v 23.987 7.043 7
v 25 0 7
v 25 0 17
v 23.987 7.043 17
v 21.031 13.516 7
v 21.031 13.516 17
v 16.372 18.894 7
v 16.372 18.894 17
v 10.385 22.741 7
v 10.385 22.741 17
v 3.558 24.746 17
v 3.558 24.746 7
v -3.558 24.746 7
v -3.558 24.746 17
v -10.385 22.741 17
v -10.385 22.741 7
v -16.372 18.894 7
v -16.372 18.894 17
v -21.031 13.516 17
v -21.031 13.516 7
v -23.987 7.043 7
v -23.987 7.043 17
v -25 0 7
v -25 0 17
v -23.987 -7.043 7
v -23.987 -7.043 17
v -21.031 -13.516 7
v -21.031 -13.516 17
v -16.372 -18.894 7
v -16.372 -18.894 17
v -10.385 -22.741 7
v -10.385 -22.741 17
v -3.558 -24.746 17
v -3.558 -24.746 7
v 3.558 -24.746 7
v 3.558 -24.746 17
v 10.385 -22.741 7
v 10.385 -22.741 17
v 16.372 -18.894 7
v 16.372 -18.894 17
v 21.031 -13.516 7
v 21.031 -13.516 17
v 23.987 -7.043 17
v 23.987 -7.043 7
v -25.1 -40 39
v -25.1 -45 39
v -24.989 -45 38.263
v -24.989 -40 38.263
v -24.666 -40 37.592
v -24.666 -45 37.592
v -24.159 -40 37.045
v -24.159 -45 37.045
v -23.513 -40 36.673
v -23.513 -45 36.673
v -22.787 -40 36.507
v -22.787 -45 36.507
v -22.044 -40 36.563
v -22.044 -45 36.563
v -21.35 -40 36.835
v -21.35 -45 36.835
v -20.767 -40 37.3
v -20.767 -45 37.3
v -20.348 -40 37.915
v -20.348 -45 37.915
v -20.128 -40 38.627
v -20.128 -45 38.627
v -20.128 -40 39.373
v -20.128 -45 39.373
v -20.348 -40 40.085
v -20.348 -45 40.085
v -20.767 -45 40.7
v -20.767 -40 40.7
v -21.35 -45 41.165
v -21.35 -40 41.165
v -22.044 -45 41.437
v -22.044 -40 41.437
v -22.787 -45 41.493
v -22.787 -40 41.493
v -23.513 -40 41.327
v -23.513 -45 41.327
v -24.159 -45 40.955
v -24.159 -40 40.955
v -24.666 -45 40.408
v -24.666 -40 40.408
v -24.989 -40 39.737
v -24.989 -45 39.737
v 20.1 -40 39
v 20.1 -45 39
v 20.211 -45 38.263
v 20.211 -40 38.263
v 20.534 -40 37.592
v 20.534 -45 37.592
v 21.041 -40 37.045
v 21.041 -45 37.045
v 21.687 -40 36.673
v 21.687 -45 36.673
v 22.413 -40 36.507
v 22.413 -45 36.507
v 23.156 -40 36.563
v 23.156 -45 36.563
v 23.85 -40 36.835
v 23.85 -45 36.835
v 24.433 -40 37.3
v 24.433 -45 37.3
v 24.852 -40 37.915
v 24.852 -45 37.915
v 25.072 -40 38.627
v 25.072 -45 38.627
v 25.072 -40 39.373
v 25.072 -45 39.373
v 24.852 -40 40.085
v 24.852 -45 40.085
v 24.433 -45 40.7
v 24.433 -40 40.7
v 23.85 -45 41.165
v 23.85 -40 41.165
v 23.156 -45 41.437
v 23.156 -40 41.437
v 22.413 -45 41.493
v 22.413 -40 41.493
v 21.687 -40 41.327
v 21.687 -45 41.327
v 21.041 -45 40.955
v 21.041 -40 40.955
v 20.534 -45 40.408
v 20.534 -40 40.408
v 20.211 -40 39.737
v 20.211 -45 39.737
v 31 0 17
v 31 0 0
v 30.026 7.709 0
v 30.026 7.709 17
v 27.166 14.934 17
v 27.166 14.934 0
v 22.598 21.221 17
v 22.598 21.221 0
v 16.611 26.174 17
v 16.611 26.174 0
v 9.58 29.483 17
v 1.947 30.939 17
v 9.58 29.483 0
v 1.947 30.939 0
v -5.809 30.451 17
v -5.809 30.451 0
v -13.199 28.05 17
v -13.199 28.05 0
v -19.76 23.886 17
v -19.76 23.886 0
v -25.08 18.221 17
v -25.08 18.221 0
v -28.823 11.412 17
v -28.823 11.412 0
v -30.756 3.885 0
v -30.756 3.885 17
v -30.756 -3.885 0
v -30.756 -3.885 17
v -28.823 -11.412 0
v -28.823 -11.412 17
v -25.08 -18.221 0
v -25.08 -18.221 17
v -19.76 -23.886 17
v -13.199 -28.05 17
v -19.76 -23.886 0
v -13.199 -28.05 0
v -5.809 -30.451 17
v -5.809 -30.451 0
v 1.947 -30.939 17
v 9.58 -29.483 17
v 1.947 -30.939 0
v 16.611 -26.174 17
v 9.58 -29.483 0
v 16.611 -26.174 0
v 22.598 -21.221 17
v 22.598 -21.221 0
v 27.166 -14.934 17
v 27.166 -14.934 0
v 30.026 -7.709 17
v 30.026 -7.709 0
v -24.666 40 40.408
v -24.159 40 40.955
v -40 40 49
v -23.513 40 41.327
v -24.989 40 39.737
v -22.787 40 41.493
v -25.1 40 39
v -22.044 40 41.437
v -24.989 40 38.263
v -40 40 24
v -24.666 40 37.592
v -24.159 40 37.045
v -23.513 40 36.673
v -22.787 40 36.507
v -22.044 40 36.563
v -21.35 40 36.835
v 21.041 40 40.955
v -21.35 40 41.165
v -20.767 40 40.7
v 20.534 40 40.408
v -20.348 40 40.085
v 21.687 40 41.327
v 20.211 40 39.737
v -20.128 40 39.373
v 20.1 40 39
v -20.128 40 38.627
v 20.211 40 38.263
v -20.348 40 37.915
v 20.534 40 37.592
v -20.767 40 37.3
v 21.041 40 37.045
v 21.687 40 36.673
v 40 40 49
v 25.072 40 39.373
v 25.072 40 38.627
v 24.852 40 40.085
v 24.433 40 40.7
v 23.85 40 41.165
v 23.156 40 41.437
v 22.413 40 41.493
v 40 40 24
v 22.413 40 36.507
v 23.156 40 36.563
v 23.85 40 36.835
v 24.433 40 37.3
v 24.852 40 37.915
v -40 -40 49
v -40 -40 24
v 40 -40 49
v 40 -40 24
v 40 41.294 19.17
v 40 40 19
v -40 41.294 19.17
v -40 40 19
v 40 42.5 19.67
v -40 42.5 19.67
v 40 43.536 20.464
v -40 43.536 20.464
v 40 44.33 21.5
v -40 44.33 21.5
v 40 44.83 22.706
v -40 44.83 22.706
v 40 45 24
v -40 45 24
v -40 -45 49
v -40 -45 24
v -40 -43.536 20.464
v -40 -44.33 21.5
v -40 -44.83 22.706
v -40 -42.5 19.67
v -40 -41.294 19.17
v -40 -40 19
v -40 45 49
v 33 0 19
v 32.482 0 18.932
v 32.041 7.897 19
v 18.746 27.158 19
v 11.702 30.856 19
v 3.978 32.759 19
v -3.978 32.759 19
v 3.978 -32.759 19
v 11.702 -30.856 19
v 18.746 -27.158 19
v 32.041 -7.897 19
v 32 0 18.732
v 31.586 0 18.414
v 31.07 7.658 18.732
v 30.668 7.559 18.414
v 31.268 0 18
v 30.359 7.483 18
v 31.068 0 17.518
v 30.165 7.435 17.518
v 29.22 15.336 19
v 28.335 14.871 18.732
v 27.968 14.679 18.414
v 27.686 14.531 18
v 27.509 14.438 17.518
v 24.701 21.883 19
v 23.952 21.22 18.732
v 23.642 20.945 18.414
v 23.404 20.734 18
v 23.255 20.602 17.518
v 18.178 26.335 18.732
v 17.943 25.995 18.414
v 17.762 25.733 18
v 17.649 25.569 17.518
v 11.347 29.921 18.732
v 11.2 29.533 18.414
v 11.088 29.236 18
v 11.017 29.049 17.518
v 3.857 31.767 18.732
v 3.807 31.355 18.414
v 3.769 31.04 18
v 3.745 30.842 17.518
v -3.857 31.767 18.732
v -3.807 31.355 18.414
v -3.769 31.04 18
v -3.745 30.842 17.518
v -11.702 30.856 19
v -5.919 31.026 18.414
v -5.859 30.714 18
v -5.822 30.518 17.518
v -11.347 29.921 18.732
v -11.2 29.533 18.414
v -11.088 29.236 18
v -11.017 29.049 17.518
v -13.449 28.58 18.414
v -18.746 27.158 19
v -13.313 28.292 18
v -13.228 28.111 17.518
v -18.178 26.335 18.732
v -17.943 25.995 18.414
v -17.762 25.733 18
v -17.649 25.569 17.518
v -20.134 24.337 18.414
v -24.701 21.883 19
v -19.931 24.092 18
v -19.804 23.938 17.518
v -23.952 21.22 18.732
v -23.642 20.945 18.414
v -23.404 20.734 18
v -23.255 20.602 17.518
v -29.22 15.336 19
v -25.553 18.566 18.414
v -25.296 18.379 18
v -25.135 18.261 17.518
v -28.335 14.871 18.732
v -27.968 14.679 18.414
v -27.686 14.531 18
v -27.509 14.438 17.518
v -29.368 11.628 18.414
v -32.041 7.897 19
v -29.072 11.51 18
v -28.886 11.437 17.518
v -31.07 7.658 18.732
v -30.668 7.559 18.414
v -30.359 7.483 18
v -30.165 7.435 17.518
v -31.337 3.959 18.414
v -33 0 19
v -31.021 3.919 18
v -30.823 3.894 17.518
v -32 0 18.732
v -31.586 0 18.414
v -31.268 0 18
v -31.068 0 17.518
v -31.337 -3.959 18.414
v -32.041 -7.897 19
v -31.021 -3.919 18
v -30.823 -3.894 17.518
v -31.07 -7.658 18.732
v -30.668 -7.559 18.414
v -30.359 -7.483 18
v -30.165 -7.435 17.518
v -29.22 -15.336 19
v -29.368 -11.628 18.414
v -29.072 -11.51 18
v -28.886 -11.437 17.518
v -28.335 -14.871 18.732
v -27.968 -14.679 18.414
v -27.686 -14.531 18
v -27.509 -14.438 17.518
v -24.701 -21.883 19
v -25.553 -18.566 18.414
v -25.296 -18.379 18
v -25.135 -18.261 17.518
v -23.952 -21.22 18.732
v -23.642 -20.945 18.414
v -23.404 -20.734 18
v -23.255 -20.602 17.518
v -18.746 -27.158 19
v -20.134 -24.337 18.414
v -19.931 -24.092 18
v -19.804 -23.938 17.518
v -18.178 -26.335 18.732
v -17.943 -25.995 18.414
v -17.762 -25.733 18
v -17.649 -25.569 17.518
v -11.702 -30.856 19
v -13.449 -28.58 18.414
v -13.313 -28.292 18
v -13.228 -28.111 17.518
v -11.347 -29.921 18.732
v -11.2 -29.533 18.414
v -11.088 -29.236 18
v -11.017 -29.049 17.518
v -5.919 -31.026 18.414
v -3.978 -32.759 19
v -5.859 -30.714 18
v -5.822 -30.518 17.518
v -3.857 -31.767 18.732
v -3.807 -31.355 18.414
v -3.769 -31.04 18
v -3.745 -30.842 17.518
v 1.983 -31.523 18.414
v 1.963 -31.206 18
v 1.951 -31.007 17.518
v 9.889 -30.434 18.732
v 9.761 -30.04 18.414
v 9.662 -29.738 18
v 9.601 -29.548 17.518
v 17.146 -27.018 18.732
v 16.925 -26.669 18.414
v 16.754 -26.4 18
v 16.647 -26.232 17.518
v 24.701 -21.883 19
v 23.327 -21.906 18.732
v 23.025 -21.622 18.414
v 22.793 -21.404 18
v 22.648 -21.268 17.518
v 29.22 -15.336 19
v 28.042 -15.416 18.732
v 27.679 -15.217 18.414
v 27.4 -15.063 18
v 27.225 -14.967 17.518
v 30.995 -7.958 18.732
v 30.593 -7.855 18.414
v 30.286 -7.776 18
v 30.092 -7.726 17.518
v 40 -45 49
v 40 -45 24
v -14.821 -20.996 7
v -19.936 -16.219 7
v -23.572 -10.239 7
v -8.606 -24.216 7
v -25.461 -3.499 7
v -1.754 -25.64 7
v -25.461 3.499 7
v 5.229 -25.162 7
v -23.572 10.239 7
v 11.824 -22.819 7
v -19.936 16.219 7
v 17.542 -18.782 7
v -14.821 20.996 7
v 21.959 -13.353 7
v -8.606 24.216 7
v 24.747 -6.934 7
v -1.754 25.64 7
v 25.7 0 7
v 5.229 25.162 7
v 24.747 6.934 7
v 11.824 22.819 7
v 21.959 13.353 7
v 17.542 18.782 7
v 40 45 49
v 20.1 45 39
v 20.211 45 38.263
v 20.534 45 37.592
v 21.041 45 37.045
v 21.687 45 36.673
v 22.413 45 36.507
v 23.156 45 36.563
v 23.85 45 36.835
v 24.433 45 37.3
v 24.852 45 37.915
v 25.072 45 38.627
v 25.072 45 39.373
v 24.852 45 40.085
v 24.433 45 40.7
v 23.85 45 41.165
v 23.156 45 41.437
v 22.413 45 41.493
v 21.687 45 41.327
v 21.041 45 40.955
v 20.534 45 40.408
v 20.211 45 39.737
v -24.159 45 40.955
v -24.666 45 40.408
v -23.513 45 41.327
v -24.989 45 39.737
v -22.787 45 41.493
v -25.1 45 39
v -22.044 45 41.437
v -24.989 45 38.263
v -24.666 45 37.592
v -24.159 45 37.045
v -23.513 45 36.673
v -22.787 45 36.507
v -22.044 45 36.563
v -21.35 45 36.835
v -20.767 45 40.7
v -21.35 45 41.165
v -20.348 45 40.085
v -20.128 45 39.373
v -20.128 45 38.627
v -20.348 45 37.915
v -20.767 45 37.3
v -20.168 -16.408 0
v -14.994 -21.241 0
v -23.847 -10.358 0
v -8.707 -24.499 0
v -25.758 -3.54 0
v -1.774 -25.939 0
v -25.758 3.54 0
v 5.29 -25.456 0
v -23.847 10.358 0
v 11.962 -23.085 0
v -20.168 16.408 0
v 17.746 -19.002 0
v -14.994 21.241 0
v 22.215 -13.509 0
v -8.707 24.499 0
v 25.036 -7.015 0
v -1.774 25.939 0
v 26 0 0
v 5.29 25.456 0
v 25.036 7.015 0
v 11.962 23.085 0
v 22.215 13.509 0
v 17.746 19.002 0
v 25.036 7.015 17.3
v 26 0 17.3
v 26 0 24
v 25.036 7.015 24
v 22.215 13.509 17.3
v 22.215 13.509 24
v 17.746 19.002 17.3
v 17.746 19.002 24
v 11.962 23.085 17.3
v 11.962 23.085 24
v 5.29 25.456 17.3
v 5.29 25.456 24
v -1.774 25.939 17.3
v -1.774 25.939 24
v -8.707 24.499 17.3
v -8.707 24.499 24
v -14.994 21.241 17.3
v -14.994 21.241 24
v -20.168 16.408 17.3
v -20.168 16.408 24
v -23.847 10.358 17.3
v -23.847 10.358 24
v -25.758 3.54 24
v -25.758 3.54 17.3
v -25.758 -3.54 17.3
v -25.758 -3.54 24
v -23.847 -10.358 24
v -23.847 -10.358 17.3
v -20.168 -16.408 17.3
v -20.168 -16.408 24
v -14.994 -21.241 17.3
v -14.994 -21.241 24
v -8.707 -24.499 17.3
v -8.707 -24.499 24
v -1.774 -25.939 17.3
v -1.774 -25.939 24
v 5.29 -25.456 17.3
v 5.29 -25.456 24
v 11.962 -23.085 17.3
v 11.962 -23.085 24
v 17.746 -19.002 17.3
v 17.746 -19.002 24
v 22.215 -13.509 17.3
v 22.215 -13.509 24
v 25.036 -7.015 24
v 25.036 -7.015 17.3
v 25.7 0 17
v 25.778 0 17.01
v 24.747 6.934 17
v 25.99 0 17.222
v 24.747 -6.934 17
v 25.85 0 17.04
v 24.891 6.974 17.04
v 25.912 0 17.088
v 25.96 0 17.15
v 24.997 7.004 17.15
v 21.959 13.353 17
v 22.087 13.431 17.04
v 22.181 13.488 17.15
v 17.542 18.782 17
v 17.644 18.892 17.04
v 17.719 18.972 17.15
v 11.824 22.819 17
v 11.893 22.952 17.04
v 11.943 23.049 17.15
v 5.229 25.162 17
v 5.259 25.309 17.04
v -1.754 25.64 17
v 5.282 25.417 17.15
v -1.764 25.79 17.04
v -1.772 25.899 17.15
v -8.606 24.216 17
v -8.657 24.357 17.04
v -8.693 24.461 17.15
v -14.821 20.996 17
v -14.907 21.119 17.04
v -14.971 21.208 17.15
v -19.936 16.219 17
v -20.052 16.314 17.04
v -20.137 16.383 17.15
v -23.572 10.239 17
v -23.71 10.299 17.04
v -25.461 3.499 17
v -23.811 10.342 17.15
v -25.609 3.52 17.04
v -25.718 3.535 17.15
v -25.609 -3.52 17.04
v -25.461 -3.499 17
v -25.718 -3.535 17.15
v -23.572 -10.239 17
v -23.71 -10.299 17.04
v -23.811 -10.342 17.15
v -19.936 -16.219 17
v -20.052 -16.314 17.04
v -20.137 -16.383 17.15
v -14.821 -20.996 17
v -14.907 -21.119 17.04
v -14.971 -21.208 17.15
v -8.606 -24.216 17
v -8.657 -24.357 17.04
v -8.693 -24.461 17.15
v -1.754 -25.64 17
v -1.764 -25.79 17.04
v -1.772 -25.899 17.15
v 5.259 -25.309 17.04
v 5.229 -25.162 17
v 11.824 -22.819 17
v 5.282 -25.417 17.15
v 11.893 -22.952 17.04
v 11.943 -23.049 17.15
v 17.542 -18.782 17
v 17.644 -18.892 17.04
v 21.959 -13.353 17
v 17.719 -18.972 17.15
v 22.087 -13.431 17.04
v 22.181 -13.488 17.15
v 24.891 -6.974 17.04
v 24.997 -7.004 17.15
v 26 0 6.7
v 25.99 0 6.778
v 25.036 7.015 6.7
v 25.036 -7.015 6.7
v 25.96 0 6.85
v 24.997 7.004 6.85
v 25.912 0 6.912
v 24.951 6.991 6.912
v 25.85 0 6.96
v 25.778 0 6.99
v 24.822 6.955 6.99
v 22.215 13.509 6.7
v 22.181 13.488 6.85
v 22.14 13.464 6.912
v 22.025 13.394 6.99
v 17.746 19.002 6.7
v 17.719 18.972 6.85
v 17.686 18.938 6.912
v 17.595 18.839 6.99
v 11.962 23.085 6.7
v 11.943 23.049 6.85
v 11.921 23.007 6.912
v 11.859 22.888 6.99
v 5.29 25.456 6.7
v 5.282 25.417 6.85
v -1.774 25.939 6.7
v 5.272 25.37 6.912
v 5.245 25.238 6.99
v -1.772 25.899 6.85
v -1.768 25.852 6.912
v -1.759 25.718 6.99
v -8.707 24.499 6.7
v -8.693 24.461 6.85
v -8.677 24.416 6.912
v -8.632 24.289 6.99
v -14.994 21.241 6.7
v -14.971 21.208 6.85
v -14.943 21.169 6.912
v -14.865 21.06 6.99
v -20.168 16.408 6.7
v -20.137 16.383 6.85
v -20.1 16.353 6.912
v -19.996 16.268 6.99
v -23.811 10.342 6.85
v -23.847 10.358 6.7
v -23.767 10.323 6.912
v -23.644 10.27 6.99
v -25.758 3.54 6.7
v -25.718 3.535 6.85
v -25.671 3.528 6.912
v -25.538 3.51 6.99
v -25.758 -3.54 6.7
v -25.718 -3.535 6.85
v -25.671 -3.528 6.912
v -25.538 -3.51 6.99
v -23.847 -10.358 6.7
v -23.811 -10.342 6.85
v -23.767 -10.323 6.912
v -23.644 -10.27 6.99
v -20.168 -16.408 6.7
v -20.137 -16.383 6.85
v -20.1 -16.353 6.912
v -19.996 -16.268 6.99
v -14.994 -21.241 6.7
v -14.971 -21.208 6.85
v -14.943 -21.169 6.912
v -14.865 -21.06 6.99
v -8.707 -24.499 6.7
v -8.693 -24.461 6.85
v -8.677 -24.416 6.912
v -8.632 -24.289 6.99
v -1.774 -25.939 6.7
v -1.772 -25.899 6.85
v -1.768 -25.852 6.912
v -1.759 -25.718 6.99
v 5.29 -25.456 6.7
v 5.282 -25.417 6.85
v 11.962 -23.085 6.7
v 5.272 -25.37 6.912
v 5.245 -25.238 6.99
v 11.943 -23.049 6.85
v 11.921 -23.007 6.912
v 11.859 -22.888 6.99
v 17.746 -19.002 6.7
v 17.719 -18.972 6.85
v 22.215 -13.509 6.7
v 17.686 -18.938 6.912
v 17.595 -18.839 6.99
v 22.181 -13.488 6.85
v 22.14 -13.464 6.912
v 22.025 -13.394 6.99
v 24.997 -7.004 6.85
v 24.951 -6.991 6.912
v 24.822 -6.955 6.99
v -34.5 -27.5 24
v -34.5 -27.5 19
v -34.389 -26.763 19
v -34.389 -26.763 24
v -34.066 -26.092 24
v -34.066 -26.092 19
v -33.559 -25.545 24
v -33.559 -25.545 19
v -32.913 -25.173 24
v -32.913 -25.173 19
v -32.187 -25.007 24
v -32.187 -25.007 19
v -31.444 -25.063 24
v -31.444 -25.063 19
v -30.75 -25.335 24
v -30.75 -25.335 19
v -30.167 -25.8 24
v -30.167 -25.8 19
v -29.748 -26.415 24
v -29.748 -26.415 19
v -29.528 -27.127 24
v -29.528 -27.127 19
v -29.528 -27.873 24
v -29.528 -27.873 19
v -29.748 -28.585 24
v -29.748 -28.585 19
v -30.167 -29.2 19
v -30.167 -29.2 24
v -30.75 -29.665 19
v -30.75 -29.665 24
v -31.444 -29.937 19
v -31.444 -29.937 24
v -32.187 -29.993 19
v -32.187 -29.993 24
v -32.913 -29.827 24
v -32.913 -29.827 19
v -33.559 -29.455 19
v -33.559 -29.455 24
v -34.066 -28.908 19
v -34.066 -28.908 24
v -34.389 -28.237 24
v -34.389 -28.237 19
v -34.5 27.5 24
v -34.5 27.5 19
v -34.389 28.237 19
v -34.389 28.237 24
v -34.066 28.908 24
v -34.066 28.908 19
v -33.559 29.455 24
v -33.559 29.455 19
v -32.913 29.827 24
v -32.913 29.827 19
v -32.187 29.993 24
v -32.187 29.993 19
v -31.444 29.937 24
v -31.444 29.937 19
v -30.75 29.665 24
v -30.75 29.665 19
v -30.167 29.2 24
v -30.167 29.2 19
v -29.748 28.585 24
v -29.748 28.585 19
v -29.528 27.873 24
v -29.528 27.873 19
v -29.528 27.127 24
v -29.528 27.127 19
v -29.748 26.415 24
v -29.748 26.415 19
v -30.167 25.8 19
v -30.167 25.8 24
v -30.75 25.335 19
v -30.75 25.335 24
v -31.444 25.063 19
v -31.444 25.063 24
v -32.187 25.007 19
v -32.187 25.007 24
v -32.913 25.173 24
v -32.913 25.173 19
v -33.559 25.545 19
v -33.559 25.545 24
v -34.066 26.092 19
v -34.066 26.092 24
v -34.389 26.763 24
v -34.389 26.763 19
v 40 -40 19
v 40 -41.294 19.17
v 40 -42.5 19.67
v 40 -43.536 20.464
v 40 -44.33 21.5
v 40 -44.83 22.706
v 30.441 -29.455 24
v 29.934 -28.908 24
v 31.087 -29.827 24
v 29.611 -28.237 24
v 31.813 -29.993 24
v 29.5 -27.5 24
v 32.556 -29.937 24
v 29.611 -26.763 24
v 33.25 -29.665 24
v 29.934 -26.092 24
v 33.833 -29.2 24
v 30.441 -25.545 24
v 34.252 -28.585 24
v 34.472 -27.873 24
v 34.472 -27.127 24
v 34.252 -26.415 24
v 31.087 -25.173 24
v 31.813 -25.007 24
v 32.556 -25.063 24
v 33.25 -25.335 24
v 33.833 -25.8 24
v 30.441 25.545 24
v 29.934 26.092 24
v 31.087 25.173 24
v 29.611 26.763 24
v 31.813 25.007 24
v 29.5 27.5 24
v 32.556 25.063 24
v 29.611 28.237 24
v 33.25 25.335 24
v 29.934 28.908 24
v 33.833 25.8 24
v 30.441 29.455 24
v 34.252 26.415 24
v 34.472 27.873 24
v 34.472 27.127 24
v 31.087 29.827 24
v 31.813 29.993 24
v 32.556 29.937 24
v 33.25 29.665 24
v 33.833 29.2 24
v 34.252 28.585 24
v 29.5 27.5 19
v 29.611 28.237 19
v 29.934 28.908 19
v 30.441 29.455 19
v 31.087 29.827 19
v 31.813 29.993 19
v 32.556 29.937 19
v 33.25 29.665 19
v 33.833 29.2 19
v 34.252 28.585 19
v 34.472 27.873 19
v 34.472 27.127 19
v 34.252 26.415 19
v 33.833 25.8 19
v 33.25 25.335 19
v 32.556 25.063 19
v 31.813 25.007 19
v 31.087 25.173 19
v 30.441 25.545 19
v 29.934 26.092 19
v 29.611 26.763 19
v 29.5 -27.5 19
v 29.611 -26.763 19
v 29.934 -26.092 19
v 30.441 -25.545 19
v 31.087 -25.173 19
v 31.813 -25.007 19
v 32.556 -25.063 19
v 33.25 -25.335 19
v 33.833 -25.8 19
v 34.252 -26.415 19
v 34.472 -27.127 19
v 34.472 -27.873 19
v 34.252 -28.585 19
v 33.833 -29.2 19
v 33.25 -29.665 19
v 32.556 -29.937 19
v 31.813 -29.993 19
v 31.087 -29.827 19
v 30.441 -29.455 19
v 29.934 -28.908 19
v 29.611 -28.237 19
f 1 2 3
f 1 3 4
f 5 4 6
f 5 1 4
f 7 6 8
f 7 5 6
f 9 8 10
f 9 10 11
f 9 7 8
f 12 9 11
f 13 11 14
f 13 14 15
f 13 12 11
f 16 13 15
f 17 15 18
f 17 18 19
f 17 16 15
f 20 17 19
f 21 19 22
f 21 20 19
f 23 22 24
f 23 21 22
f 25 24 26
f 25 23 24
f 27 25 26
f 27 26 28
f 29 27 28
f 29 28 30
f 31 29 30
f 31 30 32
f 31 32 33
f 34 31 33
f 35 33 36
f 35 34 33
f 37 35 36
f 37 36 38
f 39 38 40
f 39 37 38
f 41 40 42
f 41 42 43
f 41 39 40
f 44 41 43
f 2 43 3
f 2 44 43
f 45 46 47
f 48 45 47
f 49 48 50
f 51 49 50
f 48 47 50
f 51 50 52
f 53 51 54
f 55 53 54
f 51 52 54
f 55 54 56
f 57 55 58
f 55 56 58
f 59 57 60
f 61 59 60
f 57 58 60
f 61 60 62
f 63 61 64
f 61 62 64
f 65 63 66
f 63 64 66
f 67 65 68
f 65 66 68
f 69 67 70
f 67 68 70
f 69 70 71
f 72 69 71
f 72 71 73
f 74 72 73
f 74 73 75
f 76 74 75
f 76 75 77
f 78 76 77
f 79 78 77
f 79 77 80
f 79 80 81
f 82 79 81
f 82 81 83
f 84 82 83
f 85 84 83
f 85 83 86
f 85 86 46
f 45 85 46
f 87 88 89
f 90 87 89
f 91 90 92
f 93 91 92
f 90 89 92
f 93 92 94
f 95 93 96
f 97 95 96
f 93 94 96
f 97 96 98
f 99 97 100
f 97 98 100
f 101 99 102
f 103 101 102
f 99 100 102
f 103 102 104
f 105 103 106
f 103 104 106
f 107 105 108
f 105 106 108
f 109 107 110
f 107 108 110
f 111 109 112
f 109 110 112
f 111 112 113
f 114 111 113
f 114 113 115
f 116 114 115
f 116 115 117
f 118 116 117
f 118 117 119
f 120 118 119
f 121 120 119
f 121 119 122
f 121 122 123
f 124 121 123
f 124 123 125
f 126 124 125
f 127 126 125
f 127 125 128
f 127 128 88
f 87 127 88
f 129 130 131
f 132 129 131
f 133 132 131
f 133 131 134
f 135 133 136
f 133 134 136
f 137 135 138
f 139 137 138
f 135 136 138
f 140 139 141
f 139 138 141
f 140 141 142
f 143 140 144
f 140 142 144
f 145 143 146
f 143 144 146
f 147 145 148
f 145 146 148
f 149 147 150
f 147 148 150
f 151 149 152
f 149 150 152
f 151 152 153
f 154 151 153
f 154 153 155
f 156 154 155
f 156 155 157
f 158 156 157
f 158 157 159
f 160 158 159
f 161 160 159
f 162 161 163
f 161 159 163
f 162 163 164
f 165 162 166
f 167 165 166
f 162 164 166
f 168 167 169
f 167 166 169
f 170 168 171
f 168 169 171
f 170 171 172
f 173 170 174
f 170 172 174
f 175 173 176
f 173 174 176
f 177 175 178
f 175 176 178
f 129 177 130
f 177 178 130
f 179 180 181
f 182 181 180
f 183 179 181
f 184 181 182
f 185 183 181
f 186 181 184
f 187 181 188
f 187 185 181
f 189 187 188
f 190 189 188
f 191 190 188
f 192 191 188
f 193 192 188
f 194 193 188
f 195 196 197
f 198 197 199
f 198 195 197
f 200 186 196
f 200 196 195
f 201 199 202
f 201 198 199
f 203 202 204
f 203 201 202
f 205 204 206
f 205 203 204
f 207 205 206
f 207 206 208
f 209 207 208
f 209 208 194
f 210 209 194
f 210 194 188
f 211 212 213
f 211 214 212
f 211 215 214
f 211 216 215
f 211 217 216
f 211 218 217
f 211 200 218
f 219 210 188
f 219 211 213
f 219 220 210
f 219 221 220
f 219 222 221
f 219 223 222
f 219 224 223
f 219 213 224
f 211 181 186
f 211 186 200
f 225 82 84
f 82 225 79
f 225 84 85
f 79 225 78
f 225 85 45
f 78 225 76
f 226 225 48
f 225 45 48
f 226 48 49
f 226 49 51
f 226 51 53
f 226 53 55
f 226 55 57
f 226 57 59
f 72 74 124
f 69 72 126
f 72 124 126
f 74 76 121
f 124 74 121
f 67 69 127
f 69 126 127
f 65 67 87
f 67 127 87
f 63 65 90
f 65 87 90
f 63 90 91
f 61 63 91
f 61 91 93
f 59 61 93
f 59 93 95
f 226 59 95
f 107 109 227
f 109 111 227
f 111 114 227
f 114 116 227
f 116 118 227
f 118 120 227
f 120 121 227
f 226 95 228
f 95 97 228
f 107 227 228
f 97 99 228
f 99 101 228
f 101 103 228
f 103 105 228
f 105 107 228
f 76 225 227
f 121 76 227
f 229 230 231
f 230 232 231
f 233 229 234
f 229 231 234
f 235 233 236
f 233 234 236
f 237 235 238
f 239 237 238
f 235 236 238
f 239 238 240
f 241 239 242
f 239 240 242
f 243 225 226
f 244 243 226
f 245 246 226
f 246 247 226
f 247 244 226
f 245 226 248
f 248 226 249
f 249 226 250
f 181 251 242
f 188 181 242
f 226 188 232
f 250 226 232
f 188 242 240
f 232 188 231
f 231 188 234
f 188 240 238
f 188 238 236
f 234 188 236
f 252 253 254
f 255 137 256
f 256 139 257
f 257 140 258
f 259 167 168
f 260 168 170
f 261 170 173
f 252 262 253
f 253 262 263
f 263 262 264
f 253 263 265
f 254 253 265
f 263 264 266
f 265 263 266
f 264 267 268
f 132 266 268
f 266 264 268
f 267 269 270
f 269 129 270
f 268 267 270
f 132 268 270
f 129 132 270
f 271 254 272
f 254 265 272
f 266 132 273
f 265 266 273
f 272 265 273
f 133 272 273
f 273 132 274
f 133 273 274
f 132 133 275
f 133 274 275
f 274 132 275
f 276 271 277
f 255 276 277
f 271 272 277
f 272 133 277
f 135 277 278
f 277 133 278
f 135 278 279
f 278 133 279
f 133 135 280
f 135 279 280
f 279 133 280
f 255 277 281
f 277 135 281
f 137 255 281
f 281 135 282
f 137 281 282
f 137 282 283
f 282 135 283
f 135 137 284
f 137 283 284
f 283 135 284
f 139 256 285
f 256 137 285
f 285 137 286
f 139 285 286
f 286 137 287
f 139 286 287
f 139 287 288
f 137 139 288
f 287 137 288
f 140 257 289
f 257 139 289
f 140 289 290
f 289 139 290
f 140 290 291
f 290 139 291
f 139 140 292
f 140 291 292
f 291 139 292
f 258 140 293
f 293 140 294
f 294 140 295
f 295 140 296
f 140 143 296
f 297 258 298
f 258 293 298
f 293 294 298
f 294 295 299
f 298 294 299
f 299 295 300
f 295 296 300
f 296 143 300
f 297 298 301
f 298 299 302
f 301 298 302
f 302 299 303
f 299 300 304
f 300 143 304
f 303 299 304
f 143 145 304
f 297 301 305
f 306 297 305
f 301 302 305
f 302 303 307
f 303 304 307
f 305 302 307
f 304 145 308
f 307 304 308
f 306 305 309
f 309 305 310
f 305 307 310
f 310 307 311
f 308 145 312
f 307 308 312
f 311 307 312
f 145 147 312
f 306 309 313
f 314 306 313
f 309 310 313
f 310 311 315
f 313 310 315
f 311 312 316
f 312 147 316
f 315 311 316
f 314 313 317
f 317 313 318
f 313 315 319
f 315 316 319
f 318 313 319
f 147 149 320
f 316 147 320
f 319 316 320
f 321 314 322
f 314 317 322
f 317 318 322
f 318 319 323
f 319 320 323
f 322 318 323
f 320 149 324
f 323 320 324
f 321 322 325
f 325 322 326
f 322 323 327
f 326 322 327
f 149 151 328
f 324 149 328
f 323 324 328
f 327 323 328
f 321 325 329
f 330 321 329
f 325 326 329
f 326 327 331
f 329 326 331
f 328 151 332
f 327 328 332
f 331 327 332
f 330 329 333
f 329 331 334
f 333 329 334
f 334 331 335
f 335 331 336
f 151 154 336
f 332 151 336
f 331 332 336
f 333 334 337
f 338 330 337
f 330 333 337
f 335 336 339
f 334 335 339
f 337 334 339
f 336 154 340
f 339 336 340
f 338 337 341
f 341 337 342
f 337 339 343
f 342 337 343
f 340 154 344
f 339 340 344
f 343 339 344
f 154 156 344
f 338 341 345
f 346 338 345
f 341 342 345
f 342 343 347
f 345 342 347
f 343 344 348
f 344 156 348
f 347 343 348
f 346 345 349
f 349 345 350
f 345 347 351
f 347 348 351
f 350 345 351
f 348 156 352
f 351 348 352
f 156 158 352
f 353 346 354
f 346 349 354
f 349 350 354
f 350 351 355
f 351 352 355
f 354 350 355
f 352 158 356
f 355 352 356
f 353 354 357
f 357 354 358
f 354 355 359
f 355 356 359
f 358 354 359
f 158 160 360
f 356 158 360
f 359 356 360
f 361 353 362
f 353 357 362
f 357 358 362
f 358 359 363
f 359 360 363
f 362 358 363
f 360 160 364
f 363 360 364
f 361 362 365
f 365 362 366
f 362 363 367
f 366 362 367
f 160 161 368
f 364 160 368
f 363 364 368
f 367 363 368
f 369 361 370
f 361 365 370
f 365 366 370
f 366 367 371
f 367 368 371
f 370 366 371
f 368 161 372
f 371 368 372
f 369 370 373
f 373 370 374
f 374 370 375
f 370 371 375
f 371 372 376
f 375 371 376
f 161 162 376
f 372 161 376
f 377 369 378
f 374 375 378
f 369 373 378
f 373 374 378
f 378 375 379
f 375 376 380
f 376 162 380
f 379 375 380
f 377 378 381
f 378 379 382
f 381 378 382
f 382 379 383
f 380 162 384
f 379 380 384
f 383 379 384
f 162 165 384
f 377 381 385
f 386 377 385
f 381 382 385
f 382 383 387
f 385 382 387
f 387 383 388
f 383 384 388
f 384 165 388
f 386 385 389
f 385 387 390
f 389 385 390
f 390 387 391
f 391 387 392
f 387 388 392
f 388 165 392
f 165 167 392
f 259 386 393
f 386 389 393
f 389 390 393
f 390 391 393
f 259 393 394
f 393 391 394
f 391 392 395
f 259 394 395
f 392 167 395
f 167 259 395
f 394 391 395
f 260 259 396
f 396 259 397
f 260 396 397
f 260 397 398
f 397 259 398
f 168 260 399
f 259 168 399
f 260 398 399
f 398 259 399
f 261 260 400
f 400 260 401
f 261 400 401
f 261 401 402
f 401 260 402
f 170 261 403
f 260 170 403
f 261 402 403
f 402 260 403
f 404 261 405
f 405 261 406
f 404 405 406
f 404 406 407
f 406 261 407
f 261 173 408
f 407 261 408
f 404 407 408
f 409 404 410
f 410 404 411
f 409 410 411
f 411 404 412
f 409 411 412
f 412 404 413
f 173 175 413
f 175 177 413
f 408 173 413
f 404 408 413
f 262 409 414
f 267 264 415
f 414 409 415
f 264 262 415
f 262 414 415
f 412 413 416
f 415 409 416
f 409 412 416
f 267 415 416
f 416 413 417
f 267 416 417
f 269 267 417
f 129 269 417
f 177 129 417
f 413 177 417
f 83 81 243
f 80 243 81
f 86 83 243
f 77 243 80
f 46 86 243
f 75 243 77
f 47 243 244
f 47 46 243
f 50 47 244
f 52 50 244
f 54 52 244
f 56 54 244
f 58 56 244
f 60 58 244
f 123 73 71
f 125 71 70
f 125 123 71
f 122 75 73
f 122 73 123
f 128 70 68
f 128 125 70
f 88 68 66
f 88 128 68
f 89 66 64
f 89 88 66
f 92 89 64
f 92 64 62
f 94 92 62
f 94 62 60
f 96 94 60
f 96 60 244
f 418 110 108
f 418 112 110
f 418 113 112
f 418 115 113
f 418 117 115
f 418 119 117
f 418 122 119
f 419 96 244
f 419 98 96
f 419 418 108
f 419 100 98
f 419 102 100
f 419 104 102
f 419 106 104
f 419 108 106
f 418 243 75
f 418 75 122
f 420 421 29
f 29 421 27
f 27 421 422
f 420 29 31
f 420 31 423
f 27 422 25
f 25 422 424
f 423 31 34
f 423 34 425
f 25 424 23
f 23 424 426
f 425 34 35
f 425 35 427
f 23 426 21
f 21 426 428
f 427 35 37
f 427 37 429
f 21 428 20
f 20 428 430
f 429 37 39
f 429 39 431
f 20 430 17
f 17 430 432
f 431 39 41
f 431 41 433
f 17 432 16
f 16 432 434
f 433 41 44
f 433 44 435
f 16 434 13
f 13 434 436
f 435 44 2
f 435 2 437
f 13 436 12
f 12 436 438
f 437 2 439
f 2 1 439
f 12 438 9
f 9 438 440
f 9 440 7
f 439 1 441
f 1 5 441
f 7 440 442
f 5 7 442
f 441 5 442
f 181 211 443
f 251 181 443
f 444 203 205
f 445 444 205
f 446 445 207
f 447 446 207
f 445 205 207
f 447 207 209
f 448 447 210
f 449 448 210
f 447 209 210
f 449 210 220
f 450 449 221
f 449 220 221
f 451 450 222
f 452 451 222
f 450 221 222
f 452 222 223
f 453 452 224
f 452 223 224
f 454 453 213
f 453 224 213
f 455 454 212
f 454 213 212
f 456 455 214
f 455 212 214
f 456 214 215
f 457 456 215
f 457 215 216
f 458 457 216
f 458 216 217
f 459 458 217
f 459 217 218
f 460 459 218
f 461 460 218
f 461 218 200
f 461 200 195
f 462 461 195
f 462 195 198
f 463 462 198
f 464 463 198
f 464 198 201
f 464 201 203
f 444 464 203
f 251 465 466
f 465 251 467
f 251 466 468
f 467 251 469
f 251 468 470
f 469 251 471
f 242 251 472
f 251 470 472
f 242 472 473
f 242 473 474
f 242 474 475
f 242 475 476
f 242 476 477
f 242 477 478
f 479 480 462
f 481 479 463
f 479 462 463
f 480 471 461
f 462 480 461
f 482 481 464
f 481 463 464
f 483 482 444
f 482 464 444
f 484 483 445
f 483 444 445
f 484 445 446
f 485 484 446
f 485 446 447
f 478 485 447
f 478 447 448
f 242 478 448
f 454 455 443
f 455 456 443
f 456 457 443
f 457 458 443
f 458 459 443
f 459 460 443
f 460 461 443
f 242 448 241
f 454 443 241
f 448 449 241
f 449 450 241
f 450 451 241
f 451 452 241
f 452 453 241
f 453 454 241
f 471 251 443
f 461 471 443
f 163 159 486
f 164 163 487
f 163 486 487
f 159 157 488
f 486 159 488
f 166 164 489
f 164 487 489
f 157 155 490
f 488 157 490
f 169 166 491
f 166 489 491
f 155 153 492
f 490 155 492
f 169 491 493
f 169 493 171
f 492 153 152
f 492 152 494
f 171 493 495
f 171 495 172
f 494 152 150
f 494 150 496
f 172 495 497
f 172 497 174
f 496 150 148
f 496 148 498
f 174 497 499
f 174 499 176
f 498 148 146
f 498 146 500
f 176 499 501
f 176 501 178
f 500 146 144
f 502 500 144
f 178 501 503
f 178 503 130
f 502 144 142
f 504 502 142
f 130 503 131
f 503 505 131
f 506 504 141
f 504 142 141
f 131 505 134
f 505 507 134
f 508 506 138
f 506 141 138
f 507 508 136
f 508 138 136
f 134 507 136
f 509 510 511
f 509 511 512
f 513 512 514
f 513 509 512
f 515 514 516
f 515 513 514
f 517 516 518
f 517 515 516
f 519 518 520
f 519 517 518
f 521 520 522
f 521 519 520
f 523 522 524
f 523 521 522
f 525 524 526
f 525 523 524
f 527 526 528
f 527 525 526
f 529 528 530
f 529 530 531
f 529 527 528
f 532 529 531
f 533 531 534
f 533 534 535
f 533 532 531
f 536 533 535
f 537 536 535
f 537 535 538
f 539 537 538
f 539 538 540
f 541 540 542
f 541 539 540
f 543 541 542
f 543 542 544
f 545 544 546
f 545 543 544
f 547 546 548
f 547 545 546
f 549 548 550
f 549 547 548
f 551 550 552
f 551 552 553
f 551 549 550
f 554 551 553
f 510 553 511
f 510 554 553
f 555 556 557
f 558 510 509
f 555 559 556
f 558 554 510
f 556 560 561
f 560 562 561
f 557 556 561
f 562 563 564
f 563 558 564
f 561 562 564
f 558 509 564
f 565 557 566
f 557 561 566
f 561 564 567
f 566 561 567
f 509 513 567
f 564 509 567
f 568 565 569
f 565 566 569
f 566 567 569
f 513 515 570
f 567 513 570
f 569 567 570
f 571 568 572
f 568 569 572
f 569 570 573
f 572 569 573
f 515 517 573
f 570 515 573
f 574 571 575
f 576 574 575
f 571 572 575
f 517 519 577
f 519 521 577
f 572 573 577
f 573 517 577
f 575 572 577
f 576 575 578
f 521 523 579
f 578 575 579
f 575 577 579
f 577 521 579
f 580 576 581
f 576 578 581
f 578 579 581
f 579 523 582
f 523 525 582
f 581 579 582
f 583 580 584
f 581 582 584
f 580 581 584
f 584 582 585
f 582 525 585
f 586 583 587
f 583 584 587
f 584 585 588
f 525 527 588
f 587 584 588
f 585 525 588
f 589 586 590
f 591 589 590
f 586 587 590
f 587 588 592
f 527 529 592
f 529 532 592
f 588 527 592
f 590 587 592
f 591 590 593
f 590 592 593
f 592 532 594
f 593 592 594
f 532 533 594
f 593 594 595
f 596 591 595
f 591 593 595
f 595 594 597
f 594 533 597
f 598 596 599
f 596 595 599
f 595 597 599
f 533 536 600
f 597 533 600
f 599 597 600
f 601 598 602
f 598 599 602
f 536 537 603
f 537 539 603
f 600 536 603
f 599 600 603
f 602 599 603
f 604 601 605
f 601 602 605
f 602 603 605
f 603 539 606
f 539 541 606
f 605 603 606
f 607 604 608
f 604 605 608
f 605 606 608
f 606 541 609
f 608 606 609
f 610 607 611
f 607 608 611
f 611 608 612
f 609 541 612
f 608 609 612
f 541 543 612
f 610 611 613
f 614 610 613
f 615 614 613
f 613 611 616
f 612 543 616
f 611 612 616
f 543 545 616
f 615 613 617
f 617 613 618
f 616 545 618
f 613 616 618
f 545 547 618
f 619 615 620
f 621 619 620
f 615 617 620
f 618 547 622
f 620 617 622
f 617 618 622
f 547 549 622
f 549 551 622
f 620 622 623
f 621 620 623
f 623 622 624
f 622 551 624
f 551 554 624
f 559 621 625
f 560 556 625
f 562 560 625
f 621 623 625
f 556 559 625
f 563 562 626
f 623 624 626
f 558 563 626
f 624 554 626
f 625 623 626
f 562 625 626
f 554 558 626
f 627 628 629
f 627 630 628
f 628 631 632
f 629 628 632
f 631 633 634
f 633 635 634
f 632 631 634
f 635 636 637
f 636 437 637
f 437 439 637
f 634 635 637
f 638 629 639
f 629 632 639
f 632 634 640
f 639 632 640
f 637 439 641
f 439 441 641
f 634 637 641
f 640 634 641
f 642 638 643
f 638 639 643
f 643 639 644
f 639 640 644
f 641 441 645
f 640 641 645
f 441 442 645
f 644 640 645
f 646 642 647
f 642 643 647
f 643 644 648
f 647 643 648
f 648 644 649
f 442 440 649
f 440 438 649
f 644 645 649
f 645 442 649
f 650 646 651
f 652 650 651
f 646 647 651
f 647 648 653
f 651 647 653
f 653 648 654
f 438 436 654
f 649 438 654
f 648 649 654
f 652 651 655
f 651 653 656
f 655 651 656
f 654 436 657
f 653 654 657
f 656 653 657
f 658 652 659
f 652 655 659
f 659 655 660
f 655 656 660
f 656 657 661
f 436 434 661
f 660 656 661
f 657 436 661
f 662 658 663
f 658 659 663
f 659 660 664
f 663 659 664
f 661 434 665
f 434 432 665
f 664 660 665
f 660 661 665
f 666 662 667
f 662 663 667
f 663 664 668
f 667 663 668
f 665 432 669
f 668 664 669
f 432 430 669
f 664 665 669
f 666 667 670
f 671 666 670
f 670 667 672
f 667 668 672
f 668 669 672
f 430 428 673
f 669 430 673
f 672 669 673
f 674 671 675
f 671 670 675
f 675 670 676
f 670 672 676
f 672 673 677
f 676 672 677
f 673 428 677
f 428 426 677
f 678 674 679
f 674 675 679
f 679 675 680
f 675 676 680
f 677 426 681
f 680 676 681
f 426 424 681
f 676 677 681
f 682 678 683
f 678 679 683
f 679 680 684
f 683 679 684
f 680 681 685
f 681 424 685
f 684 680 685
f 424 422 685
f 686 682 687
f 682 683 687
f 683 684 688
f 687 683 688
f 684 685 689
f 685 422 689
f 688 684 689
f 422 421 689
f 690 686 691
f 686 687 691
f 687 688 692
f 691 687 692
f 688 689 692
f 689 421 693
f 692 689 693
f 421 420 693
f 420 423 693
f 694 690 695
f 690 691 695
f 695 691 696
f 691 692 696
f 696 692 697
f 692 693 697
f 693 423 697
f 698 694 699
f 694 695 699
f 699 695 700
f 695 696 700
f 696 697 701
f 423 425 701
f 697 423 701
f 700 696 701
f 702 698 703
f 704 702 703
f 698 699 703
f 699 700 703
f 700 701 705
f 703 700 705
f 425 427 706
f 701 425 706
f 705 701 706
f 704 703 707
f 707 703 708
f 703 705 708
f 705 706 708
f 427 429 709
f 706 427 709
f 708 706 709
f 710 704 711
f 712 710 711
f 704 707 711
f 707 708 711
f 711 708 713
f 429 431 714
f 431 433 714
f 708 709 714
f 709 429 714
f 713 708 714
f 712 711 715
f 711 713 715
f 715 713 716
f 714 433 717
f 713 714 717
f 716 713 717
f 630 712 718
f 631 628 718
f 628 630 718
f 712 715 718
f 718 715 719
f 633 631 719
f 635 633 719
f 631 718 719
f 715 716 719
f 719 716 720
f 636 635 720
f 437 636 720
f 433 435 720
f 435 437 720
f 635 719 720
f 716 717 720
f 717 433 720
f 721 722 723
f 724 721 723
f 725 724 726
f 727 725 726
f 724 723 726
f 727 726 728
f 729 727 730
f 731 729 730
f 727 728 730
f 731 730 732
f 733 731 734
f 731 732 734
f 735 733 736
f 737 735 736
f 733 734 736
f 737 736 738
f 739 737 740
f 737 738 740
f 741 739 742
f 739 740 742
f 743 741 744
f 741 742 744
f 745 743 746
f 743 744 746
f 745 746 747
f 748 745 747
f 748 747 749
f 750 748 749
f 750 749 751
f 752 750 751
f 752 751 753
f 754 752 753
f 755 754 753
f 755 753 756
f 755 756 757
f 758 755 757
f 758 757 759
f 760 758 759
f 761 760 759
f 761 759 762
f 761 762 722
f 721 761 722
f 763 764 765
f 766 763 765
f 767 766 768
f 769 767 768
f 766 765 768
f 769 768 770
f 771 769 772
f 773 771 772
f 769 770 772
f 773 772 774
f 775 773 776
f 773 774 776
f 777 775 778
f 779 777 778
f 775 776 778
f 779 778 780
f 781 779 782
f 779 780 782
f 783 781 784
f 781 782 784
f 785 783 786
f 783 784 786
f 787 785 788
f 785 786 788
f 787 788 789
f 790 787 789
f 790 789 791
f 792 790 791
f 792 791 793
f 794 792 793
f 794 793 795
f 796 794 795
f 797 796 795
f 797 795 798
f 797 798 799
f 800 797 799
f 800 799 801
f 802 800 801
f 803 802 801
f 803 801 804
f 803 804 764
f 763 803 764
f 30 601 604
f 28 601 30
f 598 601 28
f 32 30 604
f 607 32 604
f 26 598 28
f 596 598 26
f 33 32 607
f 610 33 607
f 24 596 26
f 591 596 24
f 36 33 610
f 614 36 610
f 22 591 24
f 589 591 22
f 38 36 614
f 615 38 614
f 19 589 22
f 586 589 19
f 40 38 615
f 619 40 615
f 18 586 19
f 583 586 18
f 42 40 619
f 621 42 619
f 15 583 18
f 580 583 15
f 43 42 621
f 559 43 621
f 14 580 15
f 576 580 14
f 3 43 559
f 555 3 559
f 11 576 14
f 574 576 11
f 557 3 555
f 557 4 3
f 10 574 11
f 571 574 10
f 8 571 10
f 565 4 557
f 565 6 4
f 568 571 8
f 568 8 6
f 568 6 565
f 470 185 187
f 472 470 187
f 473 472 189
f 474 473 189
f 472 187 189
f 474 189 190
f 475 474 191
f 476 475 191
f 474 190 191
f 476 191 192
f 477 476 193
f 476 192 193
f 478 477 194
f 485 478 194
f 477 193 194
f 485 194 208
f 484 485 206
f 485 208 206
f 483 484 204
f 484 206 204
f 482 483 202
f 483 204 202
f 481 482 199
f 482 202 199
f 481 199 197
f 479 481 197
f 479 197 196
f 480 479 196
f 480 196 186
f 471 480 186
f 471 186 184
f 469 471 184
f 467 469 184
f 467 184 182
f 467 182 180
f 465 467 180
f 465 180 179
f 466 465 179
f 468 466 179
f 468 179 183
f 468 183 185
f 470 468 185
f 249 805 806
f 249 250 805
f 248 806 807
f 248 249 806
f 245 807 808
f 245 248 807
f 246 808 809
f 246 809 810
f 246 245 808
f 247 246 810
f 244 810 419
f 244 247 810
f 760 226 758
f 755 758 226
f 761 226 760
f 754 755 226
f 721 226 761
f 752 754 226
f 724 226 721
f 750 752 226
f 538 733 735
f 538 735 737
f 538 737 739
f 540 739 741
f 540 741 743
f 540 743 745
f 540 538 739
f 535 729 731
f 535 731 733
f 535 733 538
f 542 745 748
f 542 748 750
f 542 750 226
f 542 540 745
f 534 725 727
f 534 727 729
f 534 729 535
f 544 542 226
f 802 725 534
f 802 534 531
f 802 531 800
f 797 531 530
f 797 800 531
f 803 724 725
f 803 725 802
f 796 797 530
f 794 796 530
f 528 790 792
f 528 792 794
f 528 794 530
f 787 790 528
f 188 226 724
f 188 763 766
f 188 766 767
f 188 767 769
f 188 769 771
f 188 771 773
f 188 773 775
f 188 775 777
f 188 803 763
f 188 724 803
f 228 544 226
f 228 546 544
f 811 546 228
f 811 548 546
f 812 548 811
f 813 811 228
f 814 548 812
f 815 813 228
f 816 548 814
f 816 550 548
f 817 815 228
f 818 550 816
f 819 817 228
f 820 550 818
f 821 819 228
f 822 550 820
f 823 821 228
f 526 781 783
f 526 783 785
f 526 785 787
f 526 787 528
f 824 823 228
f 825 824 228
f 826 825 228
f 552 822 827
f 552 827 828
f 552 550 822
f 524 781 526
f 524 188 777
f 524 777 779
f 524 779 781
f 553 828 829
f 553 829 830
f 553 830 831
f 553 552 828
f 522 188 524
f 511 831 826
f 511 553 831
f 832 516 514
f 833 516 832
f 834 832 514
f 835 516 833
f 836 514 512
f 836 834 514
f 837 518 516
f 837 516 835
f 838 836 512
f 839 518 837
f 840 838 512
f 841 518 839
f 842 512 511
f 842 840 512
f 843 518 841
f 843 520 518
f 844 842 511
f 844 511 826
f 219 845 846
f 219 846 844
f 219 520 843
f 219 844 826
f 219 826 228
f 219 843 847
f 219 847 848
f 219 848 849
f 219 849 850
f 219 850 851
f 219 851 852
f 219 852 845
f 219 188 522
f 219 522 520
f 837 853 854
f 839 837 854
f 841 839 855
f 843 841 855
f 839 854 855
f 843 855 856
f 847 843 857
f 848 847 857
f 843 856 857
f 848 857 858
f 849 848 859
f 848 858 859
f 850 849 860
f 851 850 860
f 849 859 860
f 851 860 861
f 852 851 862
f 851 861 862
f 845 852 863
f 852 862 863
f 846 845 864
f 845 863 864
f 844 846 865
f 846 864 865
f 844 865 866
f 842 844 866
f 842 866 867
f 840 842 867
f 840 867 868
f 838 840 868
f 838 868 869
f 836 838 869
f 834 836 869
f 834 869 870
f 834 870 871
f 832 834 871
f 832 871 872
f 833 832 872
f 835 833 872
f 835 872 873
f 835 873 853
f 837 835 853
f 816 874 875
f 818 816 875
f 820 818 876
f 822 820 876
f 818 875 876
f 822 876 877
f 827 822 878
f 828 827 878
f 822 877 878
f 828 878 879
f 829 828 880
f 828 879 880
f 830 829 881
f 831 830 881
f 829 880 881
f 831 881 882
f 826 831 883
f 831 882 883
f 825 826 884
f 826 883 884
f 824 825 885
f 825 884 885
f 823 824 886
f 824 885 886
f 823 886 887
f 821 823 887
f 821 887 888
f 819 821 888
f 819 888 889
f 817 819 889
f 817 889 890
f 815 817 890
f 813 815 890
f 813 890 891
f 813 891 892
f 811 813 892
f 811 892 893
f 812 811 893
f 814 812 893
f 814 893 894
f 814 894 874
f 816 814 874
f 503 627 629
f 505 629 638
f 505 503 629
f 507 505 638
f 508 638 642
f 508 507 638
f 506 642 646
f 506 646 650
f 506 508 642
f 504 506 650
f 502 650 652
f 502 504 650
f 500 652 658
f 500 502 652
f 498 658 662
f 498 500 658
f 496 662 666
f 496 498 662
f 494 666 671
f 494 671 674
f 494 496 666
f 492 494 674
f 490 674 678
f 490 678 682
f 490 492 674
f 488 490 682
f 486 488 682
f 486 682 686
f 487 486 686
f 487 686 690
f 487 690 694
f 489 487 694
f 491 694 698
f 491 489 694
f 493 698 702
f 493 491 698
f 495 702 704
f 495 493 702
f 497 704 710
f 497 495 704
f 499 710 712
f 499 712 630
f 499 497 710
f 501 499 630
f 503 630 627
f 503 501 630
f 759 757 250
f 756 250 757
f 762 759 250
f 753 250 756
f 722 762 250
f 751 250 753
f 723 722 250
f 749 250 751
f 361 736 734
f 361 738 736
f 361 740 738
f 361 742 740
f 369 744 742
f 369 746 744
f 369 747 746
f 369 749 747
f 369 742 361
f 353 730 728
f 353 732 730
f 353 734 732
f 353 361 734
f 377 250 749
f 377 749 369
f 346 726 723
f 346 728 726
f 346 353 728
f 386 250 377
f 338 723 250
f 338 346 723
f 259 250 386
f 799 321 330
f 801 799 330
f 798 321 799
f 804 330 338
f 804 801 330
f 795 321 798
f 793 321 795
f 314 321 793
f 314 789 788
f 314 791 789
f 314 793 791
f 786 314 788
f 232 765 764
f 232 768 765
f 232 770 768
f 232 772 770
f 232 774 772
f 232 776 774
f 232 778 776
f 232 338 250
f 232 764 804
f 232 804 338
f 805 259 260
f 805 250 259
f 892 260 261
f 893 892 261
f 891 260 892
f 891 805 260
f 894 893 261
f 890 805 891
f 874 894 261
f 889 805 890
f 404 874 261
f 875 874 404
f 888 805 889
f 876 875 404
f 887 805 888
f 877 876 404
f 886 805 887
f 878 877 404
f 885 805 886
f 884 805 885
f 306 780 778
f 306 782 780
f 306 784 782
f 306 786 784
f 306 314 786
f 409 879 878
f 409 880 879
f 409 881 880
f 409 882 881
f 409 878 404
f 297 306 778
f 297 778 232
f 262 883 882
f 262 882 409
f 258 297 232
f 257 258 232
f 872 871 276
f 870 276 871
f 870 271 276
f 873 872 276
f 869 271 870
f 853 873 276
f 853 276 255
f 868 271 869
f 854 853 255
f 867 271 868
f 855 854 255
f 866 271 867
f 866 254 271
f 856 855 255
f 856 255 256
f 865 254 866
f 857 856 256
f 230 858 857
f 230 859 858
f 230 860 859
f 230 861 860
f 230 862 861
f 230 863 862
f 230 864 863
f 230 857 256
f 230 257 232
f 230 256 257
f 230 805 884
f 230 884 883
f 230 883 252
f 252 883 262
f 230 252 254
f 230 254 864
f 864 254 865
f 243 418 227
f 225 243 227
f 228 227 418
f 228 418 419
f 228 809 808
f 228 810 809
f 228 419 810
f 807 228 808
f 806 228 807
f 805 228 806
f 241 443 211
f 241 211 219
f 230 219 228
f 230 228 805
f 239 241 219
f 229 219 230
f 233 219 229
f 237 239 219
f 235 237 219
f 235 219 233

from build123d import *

# Parameters (mm, degrees)
SKETCH1_R             = 31
SKETCH1_R_2           = 26
BOSS_EXTRUDE1_DEPTH   = 7
SKETCH2_R             = 31
SKETCH2_R_2           = 25
BOSS_EXTRUDE3_DEPTH   = 10
SKETCH3_R             = 31
SKETCH3_R_2           = 26
BOSS_EXTRUDE4_DEPTH   = 7
FILLET1_R             = 0.3
SKETCH4_W             = 80
SKETCH4_H             = 80
SKETCH4_R             = 31
BOSS_EXTRUDE5_DEPTH   = 5
FILLET2_R             = 2
M6X1_0_TAPPED_HOLE1_D = 5
SKETCH7_W             = 10
SKETCH7_H             = 5
BOSS_EXTRUDE6_DEPTH   = 80
FILLET3_R             = 5
SKETCH8_W             = 20
SKETCH8_H             = 5
BOSS_EXTRUDE7_DEPTH   = 80
M6X1_0_TAPPED_HOLE2_D = 5


with BuildPart() as part:
    # Sketch1 → Boss-Extrude1 (new body)
    with BuildSketch(Plane.XY):
        Circle(SKETCH1_R)
        Circle(SKETCH1_R_2, mode=Mode.SUBTRACT)
    extrude(amount=BOSS_EXTRUDE1_DEPTH)

    # Sketch2 → Boss-Extrude3 (add)
    with BuildSketch(Plane.XY.offset(7)):
        Circle(SKETCH2_R)
        Circle(SKETCH2_R_2, mode=Mode.SUBTRACT)
    extrude(amount=BOSS_EXTRUDE3_DEPTH)

    # Sketch3 → Boss-Extrude4 (add)
    with BuildSketch(Plane.XY.offset(17)):
        Circle(SKETCH3_R)
        Circle(SKETCH3_R_2, mode=Mode.SUBTRACT)
    extrude(amount=BOSS_EXTRUDE4_DEPTH)

    # Fillet1
    fillet1_edges = [part.edges().sort_by_distance(p)[0] for p in [
        (-26, 0, 7),
        (-26, 0, 17),
    ]]
    fillet(fillet1_edges, radius=FILLET1_R)

    # Sketch4 → Boss-Extrude5 (add)
    with BuildSketch(Plane.XY.offset(24)):
        Rectangle(SKETCH4_W, SKETCH4_H)
        Circle(SKETCH4_R, mode=Mode.SUBTRACT)
    extrude(amount=-BOSS_EXTRUDE5_DEPTH)

    # Fillet2
    fillet2_edges = [part.edges().sort_by_distance(p)[0] for p in [
        (-31, 0, 19),
    ]]
    fillet(fillet2_edges, radius=FILLET2_R)

    # M6x1.0 Tapped Hole1 (through all)
    with Locations(Plane.XY.offset(24)):
        with Locations((-32, 27.5), (32, 27.5), (32, -27.5), (-32, -27.5)):
            Hole(M6X1_0_TAPPED_HOLE1_D / 2)

    # Sketch7 → Boss-Extrude6 (add)
    with BuildSketch(Plane(origin=(40, 0, 0), x_dir=(0, 0, -1), z_dir=(1, 0, 0))):
        with Locations((-24, 42.5)):
            Rectangle(SKETCH7_W, SKETCH7_H)
        with Locations((-24, -42.5)):
            Rectangle(SKETCH7_W, SKETCH7_H)
    extrude(amount=-BOSS_EXTRUDE6_DEPTH)

    # Fillet3
    fillet3_edges = [part.edges().sort_by_distance(p)[0] for p in [
        (0, 45, 19),
        (0, -45, 19),
    ]]
    fillet(fillet3_edges, radius=FILLET3_R)

    # Sketch8 → Boss-Extrude7 (add)
    with BuildSketch(Plane(origin=(40, 0, 0), x_dir=(0, 0, -1), z_dir=(1, 0, 0))):
        with Locations((-39, 42.5)):
            Rectangle(SKETCH8_W, SKETCH8_H)
        with Locations((-39, -42.5)):
            Rectangle(SKETCH8_W, SKETCH8_H)
    extrude(amount=-BOSS_EXTRUDE7_DEPTH)

    # M6x1.0 Tapped Hole2 (through all)
    with Locations(Plane(origin=(0, 45, 0), x_dir=(1, 0, 0), z_dir=(0, 1, 0))):
        with Locations((-22.6, -39), (22.6, -39)):
            Hole(M6X1_0_TAPPED_HOLE2_D / 2)


solid = part.part
